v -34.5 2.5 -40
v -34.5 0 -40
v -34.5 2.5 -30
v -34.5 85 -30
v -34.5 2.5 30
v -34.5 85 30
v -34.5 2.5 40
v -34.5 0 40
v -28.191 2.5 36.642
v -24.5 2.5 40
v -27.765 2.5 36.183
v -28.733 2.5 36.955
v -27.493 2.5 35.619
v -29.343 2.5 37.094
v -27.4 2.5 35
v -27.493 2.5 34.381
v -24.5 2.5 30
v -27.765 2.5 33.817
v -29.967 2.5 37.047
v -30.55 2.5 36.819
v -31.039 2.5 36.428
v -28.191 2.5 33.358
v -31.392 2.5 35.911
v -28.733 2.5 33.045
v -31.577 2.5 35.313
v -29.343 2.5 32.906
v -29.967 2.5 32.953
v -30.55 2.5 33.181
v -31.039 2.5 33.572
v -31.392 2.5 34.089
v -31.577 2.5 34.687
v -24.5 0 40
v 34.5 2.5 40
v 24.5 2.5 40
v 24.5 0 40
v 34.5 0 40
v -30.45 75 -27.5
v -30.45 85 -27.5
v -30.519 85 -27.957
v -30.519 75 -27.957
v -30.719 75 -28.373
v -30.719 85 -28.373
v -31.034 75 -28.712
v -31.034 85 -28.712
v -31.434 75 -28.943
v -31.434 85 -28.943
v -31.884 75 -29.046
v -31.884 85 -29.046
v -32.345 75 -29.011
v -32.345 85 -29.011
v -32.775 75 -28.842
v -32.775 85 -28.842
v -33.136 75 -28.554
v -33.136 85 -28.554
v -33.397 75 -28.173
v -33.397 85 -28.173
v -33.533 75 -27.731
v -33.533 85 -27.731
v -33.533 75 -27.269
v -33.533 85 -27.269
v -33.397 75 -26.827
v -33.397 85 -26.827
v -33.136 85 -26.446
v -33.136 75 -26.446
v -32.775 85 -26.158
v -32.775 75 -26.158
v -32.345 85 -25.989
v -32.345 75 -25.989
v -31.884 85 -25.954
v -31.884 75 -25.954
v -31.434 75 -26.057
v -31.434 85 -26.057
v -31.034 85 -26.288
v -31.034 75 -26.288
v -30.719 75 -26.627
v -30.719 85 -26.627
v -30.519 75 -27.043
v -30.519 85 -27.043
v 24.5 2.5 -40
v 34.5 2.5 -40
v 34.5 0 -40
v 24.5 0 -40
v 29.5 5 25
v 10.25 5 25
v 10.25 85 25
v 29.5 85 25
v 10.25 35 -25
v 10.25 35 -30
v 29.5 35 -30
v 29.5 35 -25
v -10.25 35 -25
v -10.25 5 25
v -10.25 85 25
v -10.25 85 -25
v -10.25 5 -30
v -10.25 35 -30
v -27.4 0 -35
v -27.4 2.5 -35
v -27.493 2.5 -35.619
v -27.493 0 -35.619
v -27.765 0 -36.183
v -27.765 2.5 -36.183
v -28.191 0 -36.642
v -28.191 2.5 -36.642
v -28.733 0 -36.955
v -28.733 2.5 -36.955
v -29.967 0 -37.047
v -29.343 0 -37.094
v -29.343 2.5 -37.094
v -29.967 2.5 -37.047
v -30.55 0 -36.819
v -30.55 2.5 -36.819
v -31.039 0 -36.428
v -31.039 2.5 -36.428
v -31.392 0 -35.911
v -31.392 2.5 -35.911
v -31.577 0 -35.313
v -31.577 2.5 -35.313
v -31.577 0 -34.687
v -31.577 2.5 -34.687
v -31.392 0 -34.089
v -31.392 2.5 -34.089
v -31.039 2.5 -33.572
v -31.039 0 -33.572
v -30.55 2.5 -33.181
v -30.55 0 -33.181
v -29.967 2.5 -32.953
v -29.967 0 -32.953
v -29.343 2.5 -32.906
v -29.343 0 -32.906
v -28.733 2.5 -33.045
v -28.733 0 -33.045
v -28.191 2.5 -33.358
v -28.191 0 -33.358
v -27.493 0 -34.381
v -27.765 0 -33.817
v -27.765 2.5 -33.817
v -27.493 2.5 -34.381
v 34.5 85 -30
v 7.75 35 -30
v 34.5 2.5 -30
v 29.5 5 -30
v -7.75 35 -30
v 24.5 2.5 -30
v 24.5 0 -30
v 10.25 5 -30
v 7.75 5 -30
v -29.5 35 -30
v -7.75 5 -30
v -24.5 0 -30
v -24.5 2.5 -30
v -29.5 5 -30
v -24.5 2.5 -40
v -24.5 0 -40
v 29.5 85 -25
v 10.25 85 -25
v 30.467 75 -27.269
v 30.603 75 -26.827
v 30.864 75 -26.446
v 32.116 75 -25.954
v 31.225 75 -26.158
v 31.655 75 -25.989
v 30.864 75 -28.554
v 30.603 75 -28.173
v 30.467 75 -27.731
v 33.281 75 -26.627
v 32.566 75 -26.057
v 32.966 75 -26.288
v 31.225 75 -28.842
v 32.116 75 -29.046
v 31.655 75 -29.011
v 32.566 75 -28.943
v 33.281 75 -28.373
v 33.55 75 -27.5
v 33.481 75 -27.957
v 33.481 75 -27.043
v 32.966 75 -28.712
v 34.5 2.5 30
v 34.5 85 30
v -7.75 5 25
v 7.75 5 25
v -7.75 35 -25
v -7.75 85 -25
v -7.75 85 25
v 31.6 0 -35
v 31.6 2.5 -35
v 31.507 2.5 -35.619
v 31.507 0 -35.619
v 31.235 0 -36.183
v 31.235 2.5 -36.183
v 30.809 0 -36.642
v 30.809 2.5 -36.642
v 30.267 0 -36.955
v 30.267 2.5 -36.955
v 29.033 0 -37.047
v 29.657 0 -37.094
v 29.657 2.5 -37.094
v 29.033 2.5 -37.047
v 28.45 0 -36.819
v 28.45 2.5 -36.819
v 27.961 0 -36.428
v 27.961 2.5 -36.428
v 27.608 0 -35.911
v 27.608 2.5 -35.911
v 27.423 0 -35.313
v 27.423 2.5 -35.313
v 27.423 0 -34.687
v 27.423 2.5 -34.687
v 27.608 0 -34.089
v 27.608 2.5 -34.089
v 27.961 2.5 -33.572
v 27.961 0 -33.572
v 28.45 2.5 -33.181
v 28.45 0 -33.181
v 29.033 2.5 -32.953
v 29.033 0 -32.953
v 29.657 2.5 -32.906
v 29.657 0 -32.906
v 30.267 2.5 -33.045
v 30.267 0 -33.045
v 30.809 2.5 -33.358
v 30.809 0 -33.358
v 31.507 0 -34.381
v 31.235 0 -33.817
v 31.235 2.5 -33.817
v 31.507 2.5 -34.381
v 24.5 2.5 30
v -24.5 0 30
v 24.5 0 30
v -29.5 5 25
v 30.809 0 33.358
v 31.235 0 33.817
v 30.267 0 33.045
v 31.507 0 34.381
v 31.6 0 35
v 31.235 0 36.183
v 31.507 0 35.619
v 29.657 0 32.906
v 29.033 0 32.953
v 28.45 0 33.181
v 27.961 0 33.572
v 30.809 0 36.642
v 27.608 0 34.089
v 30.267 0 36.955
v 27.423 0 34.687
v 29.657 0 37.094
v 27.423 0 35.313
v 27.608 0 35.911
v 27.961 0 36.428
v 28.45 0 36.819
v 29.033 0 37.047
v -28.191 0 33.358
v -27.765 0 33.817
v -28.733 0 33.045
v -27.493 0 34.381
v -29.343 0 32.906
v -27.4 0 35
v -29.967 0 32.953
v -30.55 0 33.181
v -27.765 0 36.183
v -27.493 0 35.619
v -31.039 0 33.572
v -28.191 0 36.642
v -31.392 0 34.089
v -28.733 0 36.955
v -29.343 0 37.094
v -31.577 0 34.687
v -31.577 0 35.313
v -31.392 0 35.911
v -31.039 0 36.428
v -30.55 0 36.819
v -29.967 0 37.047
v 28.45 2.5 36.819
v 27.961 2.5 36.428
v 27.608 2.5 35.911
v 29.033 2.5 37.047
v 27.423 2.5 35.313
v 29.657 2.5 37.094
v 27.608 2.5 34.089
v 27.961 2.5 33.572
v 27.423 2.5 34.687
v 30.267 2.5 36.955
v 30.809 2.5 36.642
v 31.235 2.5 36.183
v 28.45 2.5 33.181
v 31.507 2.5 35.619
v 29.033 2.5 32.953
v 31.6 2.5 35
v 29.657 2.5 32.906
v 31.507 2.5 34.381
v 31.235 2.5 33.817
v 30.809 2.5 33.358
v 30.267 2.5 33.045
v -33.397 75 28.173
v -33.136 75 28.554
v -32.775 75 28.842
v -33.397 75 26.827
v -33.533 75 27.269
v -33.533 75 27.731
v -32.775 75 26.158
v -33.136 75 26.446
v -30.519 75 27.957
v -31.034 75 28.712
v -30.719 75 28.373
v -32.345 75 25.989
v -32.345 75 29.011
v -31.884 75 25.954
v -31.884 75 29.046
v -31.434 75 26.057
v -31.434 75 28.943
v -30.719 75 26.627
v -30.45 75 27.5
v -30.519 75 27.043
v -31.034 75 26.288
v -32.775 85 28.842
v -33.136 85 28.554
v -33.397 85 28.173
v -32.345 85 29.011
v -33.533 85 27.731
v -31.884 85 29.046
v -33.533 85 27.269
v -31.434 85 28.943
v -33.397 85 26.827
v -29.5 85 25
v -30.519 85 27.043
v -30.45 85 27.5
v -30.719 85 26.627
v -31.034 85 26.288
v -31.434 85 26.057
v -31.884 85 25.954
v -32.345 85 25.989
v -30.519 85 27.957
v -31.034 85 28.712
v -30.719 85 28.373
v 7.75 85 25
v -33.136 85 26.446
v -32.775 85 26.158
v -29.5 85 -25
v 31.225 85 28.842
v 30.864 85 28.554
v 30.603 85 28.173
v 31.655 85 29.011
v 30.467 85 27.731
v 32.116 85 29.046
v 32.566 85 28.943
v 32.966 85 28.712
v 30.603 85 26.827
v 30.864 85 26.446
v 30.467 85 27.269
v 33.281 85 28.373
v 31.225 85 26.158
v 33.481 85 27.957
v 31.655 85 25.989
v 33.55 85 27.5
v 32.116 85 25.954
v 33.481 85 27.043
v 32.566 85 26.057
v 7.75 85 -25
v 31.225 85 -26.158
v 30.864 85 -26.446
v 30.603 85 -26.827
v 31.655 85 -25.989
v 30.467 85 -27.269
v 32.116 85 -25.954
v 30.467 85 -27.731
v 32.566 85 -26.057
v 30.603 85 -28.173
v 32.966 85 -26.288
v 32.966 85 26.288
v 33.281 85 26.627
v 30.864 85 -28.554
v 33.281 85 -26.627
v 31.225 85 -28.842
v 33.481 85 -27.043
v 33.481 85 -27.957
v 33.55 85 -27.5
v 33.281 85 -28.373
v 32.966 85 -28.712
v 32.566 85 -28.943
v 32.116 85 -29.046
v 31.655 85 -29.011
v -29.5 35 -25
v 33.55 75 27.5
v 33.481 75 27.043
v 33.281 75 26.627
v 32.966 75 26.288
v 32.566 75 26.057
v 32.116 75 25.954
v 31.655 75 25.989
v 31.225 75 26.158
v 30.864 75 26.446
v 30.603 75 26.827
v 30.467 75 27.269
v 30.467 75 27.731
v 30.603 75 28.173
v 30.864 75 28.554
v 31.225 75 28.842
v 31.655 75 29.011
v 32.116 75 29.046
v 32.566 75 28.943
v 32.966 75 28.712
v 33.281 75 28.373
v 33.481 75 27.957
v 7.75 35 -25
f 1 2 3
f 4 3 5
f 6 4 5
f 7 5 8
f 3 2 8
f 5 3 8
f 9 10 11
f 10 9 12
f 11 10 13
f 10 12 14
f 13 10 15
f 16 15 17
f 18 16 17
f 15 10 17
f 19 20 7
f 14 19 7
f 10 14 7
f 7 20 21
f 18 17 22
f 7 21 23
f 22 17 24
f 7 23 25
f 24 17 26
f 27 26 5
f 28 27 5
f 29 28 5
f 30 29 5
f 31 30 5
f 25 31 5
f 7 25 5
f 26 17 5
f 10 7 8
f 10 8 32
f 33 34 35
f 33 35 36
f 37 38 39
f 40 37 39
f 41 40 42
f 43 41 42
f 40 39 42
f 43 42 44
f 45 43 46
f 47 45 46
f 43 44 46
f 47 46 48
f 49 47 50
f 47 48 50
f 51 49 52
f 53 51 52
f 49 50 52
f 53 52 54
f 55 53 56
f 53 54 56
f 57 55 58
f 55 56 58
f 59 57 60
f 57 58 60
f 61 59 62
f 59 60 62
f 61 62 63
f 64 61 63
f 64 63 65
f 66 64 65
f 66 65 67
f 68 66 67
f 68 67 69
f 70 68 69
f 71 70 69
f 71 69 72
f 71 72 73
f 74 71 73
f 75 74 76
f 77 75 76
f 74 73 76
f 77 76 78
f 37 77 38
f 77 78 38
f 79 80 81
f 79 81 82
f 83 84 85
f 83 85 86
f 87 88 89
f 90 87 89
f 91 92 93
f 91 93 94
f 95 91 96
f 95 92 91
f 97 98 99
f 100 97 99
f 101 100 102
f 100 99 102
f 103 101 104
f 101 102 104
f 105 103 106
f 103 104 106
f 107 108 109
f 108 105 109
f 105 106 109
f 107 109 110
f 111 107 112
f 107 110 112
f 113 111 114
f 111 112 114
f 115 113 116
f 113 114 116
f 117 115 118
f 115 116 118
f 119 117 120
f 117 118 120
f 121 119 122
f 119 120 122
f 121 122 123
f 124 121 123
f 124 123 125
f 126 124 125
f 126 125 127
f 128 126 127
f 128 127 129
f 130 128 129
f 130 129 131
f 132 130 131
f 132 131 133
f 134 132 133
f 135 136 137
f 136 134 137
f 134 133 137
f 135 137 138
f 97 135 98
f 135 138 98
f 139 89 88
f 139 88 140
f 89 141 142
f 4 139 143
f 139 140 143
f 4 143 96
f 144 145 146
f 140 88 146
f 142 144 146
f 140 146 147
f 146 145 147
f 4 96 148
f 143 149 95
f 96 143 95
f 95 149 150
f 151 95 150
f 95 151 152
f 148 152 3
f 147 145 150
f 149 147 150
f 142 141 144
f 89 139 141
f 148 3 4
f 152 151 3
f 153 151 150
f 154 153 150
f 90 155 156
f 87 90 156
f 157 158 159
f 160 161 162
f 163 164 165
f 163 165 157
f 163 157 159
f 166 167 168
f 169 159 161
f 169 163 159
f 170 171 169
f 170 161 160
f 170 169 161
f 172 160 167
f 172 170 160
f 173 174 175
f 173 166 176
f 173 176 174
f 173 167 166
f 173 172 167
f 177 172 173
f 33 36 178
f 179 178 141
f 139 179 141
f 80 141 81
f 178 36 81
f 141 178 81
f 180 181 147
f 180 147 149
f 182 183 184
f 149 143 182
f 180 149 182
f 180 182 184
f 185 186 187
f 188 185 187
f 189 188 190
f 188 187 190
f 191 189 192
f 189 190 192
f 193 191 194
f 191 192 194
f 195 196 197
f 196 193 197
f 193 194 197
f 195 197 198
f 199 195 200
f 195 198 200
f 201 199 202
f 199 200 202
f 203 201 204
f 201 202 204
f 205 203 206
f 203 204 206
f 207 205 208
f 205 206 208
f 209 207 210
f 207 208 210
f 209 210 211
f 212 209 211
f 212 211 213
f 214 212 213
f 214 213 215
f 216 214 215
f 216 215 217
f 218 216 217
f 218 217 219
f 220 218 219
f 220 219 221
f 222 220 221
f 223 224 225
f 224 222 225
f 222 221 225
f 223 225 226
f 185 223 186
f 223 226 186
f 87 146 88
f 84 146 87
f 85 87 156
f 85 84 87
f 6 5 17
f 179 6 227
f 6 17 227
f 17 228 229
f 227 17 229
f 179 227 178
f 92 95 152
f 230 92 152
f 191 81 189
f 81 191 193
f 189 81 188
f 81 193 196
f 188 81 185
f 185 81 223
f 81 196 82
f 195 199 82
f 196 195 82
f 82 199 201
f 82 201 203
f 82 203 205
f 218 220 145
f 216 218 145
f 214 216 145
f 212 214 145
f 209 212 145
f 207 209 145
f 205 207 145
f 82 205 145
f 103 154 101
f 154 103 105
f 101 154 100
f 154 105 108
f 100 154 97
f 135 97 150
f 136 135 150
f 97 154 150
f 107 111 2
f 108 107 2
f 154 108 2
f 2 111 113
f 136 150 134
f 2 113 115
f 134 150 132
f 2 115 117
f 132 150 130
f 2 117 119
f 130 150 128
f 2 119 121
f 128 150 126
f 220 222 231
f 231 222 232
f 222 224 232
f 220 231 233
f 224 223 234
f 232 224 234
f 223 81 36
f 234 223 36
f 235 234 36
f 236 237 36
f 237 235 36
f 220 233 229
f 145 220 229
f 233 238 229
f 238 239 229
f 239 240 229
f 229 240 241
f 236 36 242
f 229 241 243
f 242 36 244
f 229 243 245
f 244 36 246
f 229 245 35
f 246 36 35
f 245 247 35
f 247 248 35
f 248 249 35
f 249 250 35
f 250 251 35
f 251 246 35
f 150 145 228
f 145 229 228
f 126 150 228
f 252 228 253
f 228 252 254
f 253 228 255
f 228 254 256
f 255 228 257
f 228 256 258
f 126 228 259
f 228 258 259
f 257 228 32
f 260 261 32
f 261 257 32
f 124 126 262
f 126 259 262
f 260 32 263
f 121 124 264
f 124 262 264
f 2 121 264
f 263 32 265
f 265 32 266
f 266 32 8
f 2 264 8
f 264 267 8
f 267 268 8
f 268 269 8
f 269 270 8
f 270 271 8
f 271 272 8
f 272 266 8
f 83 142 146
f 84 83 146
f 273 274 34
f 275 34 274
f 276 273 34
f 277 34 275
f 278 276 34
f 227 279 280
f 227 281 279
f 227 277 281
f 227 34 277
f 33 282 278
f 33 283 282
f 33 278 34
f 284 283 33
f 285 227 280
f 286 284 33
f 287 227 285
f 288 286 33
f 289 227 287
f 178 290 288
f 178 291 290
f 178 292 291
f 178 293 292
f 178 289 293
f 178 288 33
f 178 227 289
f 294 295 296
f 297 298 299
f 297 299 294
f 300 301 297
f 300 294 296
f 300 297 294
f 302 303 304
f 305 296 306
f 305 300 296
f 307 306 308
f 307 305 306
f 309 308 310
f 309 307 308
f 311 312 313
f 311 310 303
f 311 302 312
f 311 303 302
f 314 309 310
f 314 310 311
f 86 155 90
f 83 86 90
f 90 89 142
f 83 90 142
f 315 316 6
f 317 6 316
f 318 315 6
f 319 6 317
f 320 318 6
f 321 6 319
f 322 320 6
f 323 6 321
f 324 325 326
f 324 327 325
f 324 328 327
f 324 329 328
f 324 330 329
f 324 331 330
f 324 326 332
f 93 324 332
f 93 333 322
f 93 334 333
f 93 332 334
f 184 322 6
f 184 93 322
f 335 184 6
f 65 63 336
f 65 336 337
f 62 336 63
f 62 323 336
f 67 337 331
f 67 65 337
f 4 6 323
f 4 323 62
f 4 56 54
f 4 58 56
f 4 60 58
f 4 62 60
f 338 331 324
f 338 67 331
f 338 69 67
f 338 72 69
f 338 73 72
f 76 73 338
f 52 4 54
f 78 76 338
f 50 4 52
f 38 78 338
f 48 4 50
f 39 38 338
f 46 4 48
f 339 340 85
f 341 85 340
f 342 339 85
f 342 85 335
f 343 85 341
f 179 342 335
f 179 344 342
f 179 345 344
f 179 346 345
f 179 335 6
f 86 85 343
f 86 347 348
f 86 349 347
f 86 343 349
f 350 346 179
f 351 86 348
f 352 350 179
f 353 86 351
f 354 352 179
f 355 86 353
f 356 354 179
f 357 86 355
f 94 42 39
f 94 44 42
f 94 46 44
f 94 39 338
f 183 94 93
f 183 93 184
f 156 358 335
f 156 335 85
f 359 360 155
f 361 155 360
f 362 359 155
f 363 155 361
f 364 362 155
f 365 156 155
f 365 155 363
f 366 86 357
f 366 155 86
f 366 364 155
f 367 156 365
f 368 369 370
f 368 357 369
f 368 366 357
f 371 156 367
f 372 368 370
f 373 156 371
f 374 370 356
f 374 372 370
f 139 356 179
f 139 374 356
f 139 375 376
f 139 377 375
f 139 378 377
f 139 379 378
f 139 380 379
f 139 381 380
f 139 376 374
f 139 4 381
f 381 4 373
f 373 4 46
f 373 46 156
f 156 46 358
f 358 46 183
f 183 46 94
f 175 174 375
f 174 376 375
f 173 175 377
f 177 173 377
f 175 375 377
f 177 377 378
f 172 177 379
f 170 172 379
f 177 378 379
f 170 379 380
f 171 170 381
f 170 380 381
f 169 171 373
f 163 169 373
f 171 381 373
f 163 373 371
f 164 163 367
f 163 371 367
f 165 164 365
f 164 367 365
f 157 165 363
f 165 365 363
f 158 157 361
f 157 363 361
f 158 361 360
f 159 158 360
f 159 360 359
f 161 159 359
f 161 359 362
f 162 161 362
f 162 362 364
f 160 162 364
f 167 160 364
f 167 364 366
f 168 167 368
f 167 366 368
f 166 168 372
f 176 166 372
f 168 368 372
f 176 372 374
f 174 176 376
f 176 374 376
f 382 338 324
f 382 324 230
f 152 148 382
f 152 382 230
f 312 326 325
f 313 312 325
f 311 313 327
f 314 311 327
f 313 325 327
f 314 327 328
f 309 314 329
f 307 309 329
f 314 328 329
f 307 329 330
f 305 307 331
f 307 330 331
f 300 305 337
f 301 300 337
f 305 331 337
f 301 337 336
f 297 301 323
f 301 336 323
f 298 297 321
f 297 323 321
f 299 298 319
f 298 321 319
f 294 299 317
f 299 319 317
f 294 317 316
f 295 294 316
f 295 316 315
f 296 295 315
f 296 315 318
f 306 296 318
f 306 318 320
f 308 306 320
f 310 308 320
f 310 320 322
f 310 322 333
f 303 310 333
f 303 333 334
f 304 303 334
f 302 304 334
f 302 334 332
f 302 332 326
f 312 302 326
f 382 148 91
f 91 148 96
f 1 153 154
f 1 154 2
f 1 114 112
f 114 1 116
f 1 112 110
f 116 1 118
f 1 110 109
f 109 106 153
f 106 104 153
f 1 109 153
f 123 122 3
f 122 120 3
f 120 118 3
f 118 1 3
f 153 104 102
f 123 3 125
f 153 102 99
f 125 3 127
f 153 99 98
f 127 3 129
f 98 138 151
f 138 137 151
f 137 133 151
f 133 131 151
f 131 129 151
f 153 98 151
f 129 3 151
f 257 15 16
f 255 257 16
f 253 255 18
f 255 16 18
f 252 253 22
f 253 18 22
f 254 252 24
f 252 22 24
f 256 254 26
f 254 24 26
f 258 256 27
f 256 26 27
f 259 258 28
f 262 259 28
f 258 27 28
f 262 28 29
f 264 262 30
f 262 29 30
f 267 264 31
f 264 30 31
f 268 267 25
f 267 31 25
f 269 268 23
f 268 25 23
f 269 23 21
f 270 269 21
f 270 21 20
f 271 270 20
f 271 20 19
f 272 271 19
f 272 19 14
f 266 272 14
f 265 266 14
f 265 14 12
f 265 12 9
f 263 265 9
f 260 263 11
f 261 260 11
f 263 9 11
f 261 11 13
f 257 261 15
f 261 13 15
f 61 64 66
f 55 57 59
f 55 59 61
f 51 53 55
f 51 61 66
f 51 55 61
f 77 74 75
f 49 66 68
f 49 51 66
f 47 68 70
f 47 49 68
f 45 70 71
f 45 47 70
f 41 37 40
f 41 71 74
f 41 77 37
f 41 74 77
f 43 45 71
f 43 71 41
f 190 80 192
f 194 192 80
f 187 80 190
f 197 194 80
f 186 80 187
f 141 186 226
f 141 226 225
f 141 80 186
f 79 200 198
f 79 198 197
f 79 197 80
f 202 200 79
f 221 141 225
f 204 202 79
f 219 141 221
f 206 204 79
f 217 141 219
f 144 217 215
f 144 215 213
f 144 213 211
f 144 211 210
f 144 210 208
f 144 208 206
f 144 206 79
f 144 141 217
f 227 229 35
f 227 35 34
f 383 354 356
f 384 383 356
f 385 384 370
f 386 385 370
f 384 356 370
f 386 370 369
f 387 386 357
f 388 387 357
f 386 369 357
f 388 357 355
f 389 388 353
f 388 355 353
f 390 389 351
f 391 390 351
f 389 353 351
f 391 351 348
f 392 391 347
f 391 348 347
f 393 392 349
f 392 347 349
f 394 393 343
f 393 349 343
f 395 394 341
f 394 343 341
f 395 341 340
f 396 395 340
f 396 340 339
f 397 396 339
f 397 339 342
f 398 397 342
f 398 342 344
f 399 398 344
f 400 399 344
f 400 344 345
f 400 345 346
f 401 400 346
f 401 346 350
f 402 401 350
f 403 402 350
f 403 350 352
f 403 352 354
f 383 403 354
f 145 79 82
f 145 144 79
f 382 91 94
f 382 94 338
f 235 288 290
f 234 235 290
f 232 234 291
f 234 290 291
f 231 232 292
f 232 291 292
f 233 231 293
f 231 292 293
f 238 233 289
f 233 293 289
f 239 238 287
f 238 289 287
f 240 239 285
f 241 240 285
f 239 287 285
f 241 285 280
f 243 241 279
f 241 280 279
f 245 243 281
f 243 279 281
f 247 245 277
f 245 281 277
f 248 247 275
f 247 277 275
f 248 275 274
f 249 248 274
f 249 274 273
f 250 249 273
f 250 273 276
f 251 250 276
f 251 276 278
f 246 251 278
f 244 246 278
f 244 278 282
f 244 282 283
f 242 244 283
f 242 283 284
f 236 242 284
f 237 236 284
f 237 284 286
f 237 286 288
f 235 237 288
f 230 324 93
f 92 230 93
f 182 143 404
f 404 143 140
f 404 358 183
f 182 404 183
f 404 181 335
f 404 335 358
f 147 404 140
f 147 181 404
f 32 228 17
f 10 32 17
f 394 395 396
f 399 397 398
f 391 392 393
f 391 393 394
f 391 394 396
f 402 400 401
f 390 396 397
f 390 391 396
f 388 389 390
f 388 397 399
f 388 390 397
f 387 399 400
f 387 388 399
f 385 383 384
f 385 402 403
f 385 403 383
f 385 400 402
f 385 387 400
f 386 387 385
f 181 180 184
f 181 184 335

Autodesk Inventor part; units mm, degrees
ref_plane "YZ Plane" through (0, 0, 0) normal (1, 0, 0) x (0, 1, 0)
sketch "Sketch1" plane through (0, 0, 0) normal (0, 1, 0) x (-1, 0, 0)
  point P0 (0, 0)
sketch "Sketch2" plane through (0, 0, 0) normal (0, 1, 0) x (-1, 0, 0)
  line L0 (34.5, 30) -> (-34.5, 30)
  line L1 (-34.5, 30) -> (-34.5, -30)
  line L2 (-34.5, -30) -> (34.5, -30)
  line L3 (34.5, -30) -> (34.5, 30)
  line L4 (34.5, 30) -> (-34.5, -30) construction
  line L5 (-34.5, 30) -> (34.5, -30) construction
  point P0 (0, 0)
  dimension "d0" = 69
  dimension "d1" = 60
extrude "Extrusion1" add sketch "Sketch2" along normal blind 85
sketch "Sketch3" plane through (0, 85, 0) normal (0, 1, 0) x (1, 0, 0)
  line L0 (-29.5, -25) -> (29.5, -25)
  line L1 (29.5, -25) -> (29.5, 25)
  line L2 (29.5, 25) -> (-29.5, 25)
  line L3 (-29.5, 25) -> (-29.5, -25)
  line L4 (-29.5, -25) -> (29.5, 25) construction
  line L5 (29.5, -25) -> (-29.5, 25) construction
  point P0 (0, 0)
  dimension "d4" = 59
  dimension "d5" = 50
extrude "Extrusion2" cut sketch "Sketch3" against normal blind 80
sketch "Sketch4" plane through (0, 85, 0) normal (0, 1, 0) x (1, 0, 0)
  circle A0 centre (32, -27.5) radius 1.55
  line L0 (-34.5, -30) -> (34.5, -30) projected
  line L1 (34.5, -30) -> (34.5, 30) projected
  circle A1 centre (32, 27.5) radius 1.55
  circle A2 centre (-32, 27.5) radius 1.55
  circle A3 centre (-32, -27.5) radius 1.55
  line L2 (34.5, 30) -> (-34.5, 30) projected
  line L3 (-34.5, 30) -> (-34.5, -30) projected
  point P0 (0, 0)
  dimension "d8" = 3.1
  dimension "d9" = 2.5
  dimension "d10" = 2.5
  dimension "d11" = 2.5
  dimension "d12" = 2.5
extrude "Extrusion3" cut sketch "Sketch4" against normal blind 10 contours A0 | A1 | A2 | A3
sketch "Sketch5" plane through (-34.5, 0, 30) normal (0, 0, 1) x (1, 0, 0)
  line L0 (0, 0) -> (0, 85) projected
  line L1 (0, 0) -> (10, 0)
  line L2 (10, 0) -> (10, 2.5)
  line L3 (10, 2.5) -> (0, 2.5)
  line L4 (0, 2.5) -> (0, 0)
  line L5 (34.5, 0) -> (34.5, 85)
  line L6 (5, 85) -> (64, 85) projected
  line L7 (69, 0) -> (59, 0)
  line L8 (59, 0) -> (59, 2.5)
  line L9 (59, 2.5) -> (69, 2.5)
  line L10 (69, 2.5) -> (69, 0)
  dimension "d15" = 10
  dimension "d16" = 2.5
extrude "Extrusion4" add sketch "Sketch5" along normal blind 10
sketch "Sketch6" plane through (-34.5, 2.5, 30) normal (0, 1, 0) x (1, 0, 0)
  circle A0 centre (5, -5) radius 2.1
  line L0 (10, -10) -> (0, -10) projected
  line L1 (0, 0) -> (0, -10) projected
  line L2 (69, 60) -> (0, 60) projected
  line L3 (34.5, 60) -> (34.5, 0)
  line L4 (0, 0) -> (69, 0) projected
  circle A1 centre (64, -5) radius 2.1
  point P0 (34.5, 30)
  dimension "d19" = 4.2
  dimension "d20" = 5
  dimension "d21" = 5
extrude "Extrusion5" cut sketch "Sketch6" against normal up to next
ref_plane "Work Plane2" through (-34.5, 85, 0) normal (0, 0, 1) x (1, 0, 0)
mirror "Mirror2" about plane through (-34.5, 85, 0) normal (0, 0, 1) of "Extrusion4", "Extrusion5"
sketch "Sketch7" plane through (34.5, 85, -30) normal (0, 0, -1) x (-1, 0, 0)
  line L0 (5, 0) -> (5, -80) projected
  line L1 (64, 0) -> (64, -80) projected
  line L2 (5, -80) -> (64, -80)
  line L3 (64, -80) -> (64, -50)
  line L4 (64, -50) -> (5, -50)
  line L5 (5, -50) -> (5, -80)
  point P0 (34.5, -85)
  point P1 (5, -50)
  dimension "d24" = 30
extrude "Extrusion6" cut sketch "Sketch7" against normal up to next
sketch "Sketch8" plane through (0, 5, 0) normal (0, 1, 0) x (1, 0, 0)
  line L0 (-29.5, 25) -> (29.5, 25) projected
  line L1 (-6.5, -25) -> (6.5, -25)
  line L2 (6.5, -25) -> (6.5, 25)
  line L3 (6.5, 25) -> (-6.5, 25)
  line L4 (-6.5, 25) -> (-6.5, -25)
  line L5 (-6.5, -25) -> (6.5, 25) construction
  line L6 (6.5, -25) -> (-6.5, 25) construction
  line L7 (29.5, -25) -> (-29.5, -25) projected
  line L8 (-6.5, 25) -> (-11.5, 25)
  line L9 (-11.5, 25) -> (-11.5, -25)
  line L10 (-11.5, -25) -> (-6.5, -25)
  line L11 (-6.5, -25) -> (-6.5, 25)
  line L12 (6.5, -25) -> (11.5, -25)
  line L13 (11.5, -25) -> (11.5, 25)
  line L14 (11.5, 25) -> (6.5, 25)
  line L15 (6.5, 25) -> (6.5, -25)
  line L16 (-10.25, 25) -> (-7.75, 25)
  line L17 (-7.75, 25) -> (-7.75, -26.1279)
  line L18 (-7.75, -26.1279) -> (-10.25, -26.1279)
  line L19 (-10.25, -26.1279) -> (-10.25, 25)
  point P0 (0, 0)
  point P1 (-10.25, -25)
  point P2 (-7.75, -25)
  dimension "d27" = 13
  dimension "d28" = 5
  dimension "d29" = 5
  dimension "d30" = 1.25
  dimension "d31" = 1.25
extrude "Extrusion7" add sketch "Sketch8" along normal blind 80 contours L0 L17 L7 L19
ref_plane "Work Plane3" through (0, 85, 25) normal (1, 0, 0) x (0, 0, -1)
mirror "Mirror3" about plane through (0, 85, 25) normal (1, 0, 0) of "Extrusion7"
sketch "Sketch9" plane through (10.25, 35, -25) normal (0, 0, -1) x (-1, 0, 0)
  line L0 (0, -30) -> (0, 50) projected
  line L1 (2.5, 0) -> (2.5, 50) projected
  line L2 (0, -30) -> (2.5, -30)
  line L3 (2.5, -30) -> (2.5, 0)
  line L4 (2.5, 0) -> (0, 0)
  line L5 (0, 0) -> (0, -30)
  line L6 (18, -30) -> (18, 0) projected
  line L7 (20.5, 50) -> (20.5, -30) projected
  line L8 (18, -30) -> (20.5, -30)
  line L9 (20.5, -30) -> (20.5, 0)
  line L10 (20.5, 0) -> (18, 0)
  line L11 (18, 0) -> (18, -30)
  point P0 (10.25, -35)
extrude "Extrusion8" add sketch "Sketch9" along normal blind 5
equation "\"d0\" = external_len"
equation "\"d1\" = external_width"
equation "\"d2\" = internal_height + thickness"
equation "\"d4\" = internal_len"
equation "\"d5\" = internal_width"
equation "\"d6\" = internal_height"
equation "\"d32\" = internal_height"
equation "\"d34\" = thickness"
equation "\"external_len\" = 69"
equation "\"external_width\" = 60"
equation "\"thickness\" = 5"
equation "\"internal_height\" = 80"
equation "\"separator_thickness\" = 2.5"
equation "\"switch_len_at_clip\" = 13"
equation "\"internal_len\" = external_len - 2 * thickness"
equation "\"internal_width\" = external_width - 2 * thickness"
properties part number "switch_pannel_box"
